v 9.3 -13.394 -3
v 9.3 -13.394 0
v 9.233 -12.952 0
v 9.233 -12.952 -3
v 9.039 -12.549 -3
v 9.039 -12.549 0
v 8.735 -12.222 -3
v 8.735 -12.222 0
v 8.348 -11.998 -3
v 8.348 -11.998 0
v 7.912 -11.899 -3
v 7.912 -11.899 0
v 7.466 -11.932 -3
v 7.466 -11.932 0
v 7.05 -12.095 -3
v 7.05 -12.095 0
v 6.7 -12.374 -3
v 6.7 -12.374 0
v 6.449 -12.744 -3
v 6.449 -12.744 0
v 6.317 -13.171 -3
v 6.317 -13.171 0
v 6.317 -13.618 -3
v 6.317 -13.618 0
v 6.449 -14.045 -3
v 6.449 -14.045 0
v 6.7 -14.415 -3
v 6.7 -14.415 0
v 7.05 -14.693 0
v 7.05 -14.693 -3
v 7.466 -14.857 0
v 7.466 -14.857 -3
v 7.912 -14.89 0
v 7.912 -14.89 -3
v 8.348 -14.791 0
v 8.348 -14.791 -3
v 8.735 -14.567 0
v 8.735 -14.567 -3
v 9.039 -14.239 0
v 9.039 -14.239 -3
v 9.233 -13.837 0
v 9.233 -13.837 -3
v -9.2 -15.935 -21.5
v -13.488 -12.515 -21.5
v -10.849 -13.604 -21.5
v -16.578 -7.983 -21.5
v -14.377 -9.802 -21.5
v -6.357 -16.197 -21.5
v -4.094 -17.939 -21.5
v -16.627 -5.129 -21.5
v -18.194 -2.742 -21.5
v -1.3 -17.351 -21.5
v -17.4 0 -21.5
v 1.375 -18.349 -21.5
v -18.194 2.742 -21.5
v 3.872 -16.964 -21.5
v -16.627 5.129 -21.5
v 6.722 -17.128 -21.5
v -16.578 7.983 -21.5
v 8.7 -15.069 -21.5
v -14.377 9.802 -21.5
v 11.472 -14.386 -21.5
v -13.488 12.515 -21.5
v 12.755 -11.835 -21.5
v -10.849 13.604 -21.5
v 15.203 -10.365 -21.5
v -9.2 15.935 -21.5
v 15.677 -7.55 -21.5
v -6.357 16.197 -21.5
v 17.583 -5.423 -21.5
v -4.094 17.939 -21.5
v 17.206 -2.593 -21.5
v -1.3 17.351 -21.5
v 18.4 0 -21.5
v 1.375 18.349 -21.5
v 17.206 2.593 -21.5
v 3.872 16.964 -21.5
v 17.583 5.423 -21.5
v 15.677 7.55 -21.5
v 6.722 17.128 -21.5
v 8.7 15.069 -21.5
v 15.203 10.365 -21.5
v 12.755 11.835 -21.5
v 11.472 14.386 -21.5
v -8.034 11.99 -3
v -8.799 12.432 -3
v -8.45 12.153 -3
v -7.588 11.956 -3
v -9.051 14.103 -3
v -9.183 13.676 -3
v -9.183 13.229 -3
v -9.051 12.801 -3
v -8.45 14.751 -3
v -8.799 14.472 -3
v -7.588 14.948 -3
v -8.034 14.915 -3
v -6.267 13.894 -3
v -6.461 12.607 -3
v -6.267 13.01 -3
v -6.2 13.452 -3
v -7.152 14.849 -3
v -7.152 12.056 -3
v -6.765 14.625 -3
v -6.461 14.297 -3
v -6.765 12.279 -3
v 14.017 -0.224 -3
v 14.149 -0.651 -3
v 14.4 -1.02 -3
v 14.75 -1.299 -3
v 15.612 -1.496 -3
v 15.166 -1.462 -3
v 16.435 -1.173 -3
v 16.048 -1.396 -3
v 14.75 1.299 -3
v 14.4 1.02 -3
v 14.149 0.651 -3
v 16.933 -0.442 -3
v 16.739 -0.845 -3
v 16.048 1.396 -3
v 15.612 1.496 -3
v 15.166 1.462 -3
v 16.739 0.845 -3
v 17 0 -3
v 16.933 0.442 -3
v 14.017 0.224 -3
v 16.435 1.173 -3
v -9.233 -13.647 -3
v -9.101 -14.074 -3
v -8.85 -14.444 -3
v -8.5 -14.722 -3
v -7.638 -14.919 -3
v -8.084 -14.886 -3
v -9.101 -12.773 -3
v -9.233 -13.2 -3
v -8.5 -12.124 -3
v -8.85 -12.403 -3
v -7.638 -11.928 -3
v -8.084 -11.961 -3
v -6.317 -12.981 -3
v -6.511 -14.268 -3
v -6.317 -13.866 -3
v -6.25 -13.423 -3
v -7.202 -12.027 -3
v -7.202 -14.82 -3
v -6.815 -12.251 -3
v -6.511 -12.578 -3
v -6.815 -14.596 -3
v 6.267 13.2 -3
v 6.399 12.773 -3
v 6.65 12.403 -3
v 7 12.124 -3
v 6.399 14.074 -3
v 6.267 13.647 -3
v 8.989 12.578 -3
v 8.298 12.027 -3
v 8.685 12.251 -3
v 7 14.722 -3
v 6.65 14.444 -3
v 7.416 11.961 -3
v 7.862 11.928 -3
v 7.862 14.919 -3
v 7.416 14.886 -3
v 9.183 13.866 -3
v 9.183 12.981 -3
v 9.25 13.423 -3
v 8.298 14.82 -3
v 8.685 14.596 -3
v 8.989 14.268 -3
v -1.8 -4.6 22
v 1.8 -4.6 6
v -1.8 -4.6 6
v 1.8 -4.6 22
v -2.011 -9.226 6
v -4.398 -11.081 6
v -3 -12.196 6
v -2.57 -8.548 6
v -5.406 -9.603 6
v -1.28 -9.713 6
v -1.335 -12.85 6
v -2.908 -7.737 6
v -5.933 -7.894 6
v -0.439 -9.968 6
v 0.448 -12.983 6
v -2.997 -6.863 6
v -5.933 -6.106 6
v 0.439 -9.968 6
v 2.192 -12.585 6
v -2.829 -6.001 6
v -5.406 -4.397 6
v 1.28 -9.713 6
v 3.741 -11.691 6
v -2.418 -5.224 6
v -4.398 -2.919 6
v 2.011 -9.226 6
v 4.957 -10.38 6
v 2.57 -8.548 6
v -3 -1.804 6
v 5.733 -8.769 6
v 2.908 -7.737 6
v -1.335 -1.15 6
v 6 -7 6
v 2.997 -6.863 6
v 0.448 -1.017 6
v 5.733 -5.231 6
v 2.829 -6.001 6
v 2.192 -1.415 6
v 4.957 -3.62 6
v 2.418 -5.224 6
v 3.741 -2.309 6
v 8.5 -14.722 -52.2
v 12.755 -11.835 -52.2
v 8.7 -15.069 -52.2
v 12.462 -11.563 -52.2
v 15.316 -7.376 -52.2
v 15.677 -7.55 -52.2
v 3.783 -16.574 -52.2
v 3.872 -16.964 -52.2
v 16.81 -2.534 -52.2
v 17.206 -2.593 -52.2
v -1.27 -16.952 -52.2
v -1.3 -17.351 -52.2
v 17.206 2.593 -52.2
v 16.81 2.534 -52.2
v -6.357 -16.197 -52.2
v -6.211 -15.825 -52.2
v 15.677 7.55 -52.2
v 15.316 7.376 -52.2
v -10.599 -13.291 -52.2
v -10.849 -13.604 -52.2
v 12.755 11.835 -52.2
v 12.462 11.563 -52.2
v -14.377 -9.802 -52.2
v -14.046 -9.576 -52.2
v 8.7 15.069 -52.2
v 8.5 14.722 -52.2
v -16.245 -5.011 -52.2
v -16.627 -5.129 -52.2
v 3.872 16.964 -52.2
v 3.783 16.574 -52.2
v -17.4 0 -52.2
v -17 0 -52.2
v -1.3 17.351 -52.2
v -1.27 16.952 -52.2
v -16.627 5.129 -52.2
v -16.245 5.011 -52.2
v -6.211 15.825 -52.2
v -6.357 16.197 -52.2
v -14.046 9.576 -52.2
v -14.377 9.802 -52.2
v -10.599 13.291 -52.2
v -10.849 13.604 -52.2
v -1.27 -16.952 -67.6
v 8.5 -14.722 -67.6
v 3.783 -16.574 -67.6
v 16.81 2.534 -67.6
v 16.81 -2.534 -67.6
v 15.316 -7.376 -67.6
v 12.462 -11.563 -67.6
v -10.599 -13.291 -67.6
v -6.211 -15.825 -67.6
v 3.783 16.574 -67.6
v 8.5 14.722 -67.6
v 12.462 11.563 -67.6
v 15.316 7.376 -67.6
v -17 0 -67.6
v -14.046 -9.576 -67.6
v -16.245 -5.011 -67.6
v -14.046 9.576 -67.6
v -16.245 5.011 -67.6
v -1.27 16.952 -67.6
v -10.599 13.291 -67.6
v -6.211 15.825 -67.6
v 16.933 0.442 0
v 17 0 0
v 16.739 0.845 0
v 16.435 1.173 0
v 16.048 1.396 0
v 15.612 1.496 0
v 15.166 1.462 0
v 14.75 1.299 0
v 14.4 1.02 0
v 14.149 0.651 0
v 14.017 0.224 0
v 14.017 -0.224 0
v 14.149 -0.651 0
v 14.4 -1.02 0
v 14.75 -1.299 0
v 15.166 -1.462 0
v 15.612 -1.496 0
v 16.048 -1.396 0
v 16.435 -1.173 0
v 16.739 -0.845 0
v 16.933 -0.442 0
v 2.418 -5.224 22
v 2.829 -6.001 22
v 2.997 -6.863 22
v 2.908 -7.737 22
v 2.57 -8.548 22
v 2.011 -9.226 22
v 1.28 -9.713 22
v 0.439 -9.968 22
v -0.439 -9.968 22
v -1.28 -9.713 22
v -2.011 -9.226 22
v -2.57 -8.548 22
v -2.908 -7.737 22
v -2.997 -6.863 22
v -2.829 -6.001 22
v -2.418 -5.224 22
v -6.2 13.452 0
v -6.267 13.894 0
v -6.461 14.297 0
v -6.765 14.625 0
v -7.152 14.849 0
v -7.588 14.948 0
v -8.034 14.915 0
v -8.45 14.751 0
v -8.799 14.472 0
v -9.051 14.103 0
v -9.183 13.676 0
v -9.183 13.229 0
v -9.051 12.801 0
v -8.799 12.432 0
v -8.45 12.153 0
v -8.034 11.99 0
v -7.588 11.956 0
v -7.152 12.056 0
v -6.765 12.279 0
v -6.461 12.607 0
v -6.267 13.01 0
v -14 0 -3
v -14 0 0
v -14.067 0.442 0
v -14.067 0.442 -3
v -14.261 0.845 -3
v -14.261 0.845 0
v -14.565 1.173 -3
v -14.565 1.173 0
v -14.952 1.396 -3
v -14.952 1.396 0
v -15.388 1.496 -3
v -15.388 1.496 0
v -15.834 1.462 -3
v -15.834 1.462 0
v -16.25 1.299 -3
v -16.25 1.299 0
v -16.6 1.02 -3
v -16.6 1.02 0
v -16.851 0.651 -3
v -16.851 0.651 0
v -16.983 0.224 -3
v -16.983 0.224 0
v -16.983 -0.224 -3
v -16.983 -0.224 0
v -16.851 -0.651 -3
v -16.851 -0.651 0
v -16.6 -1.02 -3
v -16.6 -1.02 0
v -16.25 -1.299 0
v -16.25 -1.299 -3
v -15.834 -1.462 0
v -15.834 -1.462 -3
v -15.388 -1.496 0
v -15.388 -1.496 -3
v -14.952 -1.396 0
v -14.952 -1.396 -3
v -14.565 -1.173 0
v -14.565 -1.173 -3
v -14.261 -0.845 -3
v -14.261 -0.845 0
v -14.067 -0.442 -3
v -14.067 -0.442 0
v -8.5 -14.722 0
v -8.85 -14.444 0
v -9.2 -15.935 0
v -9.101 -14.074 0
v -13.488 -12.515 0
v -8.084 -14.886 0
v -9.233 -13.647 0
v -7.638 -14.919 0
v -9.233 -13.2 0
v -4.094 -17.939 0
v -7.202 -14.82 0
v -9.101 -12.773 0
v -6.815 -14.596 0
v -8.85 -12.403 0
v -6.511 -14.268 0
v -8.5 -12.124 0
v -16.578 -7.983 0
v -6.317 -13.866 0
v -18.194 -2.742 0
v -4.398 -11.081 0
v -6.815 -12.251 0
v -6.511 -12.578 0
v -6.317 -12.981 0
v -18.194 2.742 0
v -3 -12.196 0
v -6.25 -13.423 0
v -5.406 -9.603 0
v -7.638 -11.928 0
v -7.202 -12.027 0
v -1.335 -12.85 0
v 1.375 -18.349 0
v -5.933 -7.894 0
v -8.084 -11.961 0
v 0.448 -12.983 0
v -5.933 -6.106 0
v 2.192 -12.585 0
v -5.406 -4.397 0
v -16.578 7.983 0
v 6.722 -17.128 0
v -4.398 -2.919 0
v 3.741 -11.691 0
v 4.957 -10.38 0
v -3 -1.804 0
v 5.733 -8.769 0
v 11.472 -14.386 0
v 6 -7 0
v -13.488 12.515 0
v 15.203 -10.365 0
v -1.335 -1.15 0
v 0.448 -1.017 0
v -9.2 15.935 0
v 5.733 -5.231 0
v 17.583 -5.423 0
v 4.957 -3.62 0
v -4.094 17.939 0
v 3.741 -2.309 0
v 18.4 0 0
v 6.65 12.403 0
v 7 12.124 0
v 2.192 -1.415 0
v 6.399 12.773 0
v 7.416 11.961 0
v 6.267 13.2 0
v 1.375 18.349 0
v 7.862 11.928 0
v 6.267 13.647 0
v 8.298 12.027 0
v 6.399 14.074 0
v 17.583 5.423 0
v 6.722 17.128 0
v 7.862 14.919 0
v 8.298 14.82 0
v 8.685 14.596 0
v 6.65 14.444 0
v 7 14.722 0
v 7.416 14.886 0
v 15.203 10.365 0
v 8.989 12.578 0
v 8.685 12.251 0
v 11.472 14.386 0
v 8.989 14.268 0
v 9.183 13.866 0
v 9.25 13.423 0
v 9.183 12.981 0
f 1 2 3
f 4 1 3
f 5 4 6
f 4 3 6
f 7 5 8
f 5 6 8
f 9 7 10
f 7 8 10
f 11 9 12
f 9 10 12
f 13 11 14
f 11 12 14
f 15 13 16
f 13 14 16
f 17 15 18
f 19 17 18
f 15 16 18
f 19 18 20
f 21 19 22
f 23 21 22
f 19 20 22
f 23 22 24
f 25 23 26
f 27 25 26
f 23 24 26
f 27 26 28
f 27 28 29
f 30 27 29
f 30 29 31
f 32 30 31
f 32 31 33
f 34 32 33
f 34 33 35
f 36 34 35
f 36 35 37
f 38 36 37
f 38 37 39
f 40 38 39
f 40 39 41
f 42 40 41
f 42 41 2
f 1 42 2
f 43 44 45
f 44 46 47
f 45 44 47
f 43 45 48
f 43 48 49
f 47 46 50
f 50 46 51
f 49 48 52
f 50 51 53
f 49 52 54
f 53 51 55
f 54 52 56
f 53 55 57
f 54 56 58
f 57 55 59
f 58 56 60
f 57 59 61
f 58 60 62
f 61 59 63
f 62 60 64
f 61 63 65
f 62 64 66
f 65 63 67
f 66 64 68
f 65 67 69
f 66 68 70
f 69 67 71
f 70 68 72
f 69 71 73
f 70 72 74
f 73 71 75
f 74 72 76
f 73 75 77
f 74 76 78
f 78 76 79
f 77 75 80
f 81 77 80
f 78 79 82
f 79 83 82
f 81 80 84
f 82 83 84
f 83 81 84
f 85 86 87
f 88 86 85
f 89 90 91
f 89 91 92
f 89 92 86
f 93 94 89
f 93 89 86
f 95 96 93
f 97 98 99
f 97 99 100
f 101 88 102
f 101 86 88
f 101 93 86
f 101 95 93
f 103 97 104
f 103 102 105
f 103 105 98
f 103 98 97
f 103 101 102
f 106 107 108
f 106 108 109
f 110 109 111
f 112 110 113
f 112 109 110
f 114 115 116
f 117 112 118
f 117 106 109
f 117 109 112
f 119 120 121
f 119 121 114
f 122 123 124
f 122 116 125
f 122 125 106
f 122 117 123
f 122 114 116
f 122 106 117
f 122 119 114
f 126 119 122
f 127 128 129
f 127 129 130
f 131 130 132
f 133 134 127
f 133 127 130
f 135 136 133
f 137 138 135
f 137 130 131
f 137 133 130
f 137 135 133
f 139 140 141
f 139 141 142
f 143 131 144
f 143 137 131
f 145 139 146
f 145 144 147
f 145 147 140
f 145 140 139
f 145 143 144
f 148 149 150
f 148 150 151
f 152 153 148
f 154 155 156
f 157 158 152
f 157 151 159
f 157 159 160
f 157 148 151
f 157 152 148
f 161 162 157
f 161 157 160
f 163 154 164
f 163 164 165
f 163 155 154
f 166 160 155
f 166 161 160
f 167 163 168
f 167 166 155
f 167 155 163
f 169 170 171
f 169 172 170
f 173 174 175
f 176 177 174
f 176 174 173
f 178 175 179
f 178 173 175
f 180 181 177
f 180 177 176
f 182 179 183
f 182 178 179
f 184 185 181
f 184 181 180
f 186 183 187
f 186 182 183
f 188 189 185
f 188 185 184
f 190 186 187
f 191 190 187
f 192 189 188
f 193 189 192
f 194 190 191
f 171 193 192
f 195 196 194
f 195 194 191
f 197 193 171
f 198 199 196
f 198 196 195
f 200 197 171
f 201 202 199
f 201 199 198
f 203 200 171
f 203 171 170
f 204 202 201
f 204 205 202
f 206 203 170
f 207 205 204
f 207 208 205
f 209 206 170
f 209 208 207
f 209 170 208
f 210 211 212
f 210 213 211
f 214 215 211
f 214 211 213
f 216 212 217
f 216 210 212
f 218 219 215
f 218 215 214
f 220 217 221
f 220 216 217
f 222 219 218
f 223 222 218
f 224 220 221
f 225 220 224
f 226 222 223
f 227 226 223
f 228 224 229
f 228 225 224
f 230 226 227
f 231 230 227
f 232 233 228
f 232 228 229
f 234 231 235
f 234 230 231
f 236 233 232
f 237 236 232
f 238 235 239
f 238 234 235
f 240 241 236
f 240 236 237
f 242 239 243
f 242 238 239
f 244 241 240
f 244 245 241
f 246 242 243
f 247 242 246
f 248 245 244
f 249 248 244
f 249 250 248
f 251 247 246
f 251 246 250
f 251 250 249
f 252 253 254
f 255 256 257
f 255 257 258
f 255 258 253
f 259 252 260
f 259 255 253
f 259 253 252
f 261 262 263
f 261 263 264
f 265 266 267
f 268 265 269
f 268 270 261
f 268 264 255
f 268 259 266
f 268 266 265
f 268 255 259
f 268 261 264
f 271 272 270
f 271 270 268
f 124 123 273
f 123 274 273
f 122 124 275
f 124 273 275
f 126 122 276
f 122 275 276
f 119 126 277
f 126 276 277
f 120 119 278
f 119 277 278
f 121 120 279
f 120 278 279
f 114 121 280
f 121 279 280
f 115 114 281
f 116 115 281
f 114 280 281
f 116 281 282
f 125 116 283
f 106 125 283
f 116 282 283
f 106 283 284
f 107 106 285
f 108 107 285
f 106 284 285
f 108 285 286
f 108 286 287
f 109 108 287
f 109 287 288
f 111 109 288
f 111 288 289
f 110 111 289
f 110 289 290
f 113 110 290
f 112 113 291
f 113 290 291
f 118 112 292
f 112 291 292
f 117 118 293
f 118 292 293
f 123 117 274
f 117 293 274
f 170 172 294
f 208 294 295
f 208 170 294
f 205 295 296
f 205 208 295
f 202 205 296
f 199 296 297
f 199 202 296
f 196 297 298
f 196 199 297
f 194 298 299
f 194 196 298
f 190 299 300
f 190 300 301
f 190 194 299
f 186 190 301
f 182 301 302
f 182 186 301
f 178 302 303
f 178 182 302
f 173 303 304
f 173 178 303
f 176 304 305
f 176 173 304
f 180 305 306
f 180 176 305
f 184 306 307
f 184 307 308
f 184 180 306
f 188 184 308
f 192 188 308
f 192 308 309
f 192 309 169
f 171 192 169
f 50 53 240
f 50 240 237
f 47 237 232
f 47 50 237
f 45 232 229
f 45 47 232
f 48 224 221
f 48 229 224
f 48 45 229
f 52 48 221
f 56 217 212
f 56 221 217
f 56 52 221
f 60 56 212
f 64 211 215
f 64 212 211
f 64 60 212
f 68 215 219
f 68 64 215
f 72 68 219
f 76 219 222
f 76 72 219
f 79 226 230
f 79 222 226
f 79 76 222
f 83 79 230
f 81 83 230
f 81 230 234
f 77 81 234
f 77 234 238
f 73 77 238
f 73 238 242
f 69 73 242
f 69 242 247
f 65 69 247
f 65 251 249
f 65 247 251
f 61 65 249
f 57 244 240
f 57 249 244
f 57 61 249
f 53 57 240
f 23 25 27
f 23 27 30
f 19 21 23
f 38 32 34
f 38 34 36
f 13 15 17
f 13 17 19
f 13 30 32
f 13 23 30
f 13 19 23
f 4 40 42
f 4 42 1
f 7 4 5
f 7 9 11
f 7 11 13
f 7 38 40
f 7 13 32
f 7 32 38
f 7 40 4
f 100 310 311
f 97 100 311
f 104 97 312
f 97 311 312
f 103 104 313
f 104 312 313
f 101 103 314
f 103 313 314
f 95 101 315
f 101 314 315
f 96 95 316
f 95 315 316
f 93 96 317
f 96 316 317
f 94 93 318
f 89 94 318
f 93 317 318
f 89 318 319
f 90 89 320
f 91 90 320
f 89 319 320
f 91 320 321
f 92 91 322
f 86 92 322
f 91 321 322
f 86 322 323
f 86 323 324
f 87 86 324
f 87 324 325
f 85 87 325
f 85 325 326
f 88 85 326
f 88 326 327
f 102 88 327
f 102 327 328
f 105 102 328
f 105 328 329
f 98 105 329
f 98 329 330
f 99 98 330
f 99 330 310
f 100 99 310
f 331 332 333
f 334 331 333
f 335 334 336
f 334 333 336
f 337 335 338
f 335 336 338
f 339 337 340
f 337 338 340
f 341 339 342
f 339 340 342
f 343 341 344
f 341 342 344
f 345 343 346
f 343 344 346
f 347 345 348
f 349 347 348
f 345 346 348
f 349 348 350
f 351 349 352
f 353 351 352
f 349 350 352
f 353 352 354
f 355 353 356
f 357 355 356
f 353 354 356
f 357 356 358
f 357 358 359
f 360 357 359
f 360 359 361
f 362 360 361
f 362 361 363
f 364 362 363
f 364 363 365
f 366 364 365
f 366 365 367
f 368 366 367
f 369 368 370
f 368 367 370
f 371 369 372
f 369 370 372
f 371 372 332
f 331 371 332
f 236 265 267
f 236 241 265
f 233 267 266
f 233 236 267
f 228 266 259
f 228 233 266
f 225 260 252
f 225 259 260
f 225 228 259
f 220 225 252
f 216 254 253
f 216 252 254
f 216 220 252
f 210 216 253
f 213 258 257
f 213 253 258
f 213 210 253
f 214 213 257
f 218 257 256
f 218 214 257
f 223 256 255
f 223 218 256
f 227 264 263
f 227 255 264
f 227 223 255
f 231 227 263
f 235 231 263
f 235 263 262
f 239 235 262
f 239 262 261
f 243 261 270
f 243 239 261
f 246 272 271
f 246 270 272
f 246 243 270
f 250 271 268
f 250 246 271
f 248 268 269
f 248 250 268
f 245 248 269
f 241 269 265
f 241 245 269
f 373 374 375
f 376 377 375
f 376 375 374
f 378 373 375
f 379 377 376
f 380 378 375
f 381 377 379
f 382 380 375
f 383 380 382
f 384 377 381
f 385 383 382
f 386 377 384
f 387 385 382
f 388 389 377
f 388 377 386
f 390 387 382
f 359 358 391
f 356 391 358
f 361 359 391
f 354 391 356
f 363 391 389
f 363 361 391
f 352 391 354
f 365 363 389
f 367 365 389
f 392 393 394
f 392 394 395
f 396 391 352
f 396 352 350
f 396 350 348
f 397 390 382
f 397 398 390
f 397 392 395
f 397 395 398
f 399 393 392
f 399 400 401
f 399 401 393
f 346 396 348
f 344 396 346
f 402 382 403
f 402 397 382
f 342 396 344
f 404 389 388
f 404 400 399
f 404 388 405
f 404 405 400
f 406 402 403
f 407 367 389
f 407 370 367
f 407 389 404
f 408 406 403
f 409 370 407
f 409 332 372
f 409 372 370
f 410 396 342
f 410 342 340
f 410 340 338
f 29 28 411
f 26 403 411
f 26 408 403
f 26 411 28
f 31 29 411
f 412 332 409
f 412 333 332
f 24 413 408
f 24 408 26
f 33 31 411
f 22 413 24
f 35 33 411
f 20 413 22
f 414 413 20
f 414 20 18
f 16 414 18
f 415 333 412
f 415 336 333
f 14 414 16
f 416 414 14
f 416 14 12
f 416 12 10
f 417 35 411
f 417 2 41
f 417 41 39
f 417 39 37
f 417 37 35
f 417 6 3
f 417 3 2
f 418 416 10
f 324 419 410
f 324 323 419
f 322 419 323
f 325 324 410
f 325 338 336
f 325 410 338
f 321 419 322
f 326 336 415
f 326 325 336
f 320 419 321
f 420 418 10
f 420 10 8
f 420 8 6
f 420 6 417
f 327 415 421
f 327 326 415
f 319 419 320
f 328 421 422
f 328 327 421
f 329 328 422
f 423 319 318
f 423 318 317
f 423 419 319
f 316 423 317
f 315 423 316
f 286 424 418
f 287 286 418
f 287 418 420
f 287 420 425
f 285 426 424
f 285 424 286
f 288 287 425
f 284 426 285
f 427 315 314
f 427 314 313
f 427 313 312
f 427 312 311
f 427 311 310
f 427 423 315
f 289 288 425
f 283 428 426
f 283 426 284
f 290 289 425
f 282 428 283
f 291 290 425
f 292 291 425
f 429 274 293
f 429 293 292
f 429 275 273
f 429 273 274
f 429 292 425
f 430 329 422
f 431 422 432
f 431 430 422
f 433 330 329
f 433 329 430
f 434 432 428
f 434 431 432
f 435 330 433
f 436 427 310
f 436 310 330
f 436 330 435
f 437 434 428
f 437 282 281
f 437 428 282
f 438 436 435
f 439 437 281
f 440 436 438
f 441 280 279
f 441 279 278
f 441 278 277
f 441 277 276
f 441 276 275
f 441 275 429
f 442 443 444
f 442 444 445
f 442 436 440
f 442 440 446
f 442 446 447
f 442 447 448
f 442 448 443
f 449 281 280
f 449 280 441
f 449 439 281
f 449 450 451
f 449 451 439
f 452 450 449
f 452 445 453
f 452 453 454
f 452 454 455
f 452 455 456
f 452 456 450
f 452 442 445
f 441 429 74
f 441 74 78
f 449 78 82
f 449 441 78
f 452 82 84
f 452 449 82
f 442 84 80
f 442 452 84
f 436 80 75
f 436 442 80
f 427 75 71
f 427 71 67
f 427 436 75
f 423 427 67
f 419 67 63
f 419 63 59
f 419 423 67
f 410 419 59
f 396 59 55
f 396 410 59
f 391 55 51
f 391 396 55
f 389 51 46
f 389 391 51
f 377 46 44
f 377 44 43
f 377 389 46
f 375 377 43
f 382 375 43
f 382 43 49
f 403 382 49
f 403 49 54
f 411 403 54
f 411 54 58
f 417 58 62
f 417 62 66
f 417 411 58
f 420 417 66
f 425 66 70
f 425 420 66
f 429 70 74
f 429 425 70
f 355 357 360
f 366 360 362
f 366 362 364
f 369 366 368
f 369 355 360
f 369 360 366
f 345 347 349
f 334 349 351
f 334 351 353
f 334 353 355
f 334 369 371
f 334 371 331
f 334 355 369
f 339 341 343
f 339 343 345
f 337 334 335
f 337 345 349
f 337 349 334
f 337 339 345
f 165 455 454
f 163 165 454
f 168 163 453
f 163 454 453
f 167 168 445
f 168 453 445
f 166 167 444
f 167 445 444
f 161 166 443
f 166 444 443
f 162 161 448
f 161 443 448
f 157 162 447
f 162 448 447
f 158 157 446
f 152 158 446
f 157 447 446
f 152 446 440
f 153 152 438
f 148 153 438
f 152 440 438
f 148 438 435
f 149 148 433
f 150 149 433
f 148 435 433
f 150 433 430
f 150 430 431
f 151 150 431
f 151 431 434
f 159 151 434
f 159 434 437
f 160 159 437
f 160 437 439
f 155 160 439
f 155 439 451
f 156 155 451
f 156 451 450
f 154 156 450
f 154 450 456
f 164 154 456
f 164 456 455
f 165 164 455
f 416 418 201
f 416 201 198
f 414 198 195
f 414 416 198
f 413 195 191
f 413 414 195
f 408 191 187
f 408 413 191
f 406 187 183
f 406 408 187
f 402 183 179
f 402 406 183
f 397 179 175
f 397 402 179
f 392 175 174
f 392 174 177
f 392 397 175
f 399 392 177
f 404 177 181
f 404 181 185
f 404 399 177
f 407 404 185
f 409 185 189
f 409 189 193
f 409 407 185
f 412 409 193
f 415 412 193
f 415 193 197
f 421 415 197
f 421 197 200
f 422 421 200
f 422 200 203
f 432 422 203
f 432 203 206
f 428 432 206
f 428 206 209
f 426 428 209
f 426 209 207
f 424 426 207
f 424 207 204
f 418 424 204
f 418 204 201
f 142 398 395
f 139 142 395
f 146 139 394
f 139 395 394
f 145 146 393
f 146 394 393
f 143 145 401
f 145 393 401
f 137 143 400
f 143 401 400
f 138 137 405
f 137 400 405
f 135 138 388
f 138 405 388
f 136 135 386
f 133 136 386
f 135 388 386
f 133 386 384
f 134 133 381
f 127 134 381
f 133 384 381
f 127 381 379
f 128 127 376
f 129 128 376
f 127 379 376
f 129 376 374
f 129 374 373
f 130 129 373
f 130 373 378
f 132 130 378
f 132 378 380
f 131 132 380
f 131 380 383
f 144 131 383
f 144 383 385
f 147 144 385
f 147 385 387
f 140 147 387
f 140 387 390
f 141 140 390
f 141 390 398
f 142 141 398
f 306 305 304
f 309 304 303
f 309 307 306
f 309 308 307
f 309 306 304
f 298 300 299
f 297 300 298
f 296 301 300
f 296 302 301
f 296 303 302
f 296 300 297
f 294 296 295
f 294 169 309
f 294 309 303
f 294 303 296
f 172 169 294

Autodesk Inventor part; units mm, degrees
ref_plane "YZ Plane" through (0, 0, 0) normal (1, 0, 0) x (0, 1, 0)
ref_plane "XZ Plane" through (0, 0, 0) normal (0, 1, 0) x (-1, 0, 0)
ref_plane "XY Plane" through (0, 0, 0) normal (0, 0, 1) x (1, 0, 0)
sketch "Sketch1" plane through (0, 0, 0) normal (0, 0, 1) x (1, 0, 0)
  point P0 (0, 0)
sketch "Sketch2" plane through (0, 0, 0) normal (0, 0, 1) x (1, 0, 0)
  circle A0 centre (0, 0) radius 18.4
  dimension "d0" = 36.8
extrude "Extrusion1" add sketch "Sketch2" against normal blind 21.5
sketch "Sketch3" plane through (0, 0, -21.5) normal (0, 0, -1) x (-1, 0, 0)
  circle A0 centre (0, 0) radius 17.4
  dimension "d3" = 34.8
extrude "Extrusion2" add sketch "Sketch3" along normal blind 30.7
sketch "Sketch4" plane through (0, 0, -52.2) normal (0, 0, -1) x (-1, 0, 0)
  circle A0 centre (0, 0) radius 17
  dimension "d6" = 34
extrude "Extrusion3" add sketch "Sketch4" along normal blind 15.4
sketch "Sketch5" plane through (0, 0, 0) normal (0, 0, 1) x (1, 0, 0)
  circle A0 centre (-15.5, 0) radius 1.5
  circle A1 centre (0, 0) radius 18.4 projected
  line L0 (-18.4, 0) -> (18.4, 0)
  line L1 (-1.5961, -18.3306) -> (-1.5961, -18.3306)
  line L2 (0, 18.4) -> (0, -18.4)
  circle A2 centre (0, -7) radius 6
  circle A3 centre (15.5, 0) radius 1.5
  circle A4 centre (0, 0) radius 15.5
  line L3 (-11.863, 20.6629) -> (9.25, -15.9059)
  circle A5 centre (0, 0) radius 18.4 projected
  line L4 (-9.2, -15.9349) -> (9.2, 15.9349)
  circle A6 centre (7.8, -13.3944) radius 1.5
  circle A7 centre (7.75, 13.4234) radius 1.5
  circle A8 centre (-7.75, -13.4234) radius 1.5
  circle A9 centre (-7.6999, 13.4522) radius 1.5
  point P0 (7.75, 13.4234)
  point P1 (7.8, -13.3944)
  dimension "d10" = 3
  dimension "d11" = 12
  dimension "d12" = 7
  dimension "d15" = 3
  dimension "d16" = 31
  dimension "d17" = 2.9
  dimension "d19" = 60
  dimension "d20" = 60
  dimension "d21" = 3
  dimension "d22" = 3
  dimension "d23" = 3
  dimension "d24" = 3
extrude "Extrusion4" add sketch "Sketch5" along normal blind 6 contours A2 L3 L2 | L2 A2 L4 | L4 A2 | A2 L3 picked at (-1.9225, -8.5027)
extrude "Extrusion5" cut sketch "Sketch5" against normal blind 3 contours L0 A4 A0 | A0 A4 L0 | A4 L0 A0 | A0 L0 A4 | A9 L3 A4 | A4 L3 A9 | A8 L4 A4 | A4 L4 A8 | L3 A9 A4 | A4 A9 L3 | L4 A8 A4 | A4 A8 L4 | A3 A4 L0 | L0 A4 A3 | A7 A4 L4 | L4 A4 A7 | A4 A3 L0 | L0 A3 A4 | A7 L4 A4 | L4 A7 A4 | A6 L3 A4 | A4 L3 A6 | L3 A4 A6 | A4 L3 A6
sketch "Sketch6" plane through (0, -7, 6) normal (0, 0, 1) x (1, 0, 0)
  circle A0 centre (0, 0) radius 6 projected
  circle A1 centre (0, 0) radius 3
  point P0 (0, 7)
  dimension "d27" = 6
extrude "Extrusion6" add sketch "Sketch6" along normal blind 16 contours A1
sketch "Sketch7" plane through (0, -7, 22) normal (0, 0, 1) x (1, 0, 0)
  line L0 (-6, 3) -> (6, 3)
  line L1 (6, 3) -> (6, 2.4)
  line L2 (6, 2.4) -> (-6, 2.4)
  line L3 (-6, 2.4) -> (-6, 3)
  circle A0 centre (0, 0) radius 6 projected
  circle A1 centre (0, 0) radius 3 projected
  circle A2 centre (0, 0) radius 3 projected
  line L4 (0, 3) -> (0, -3)
  point P0 (0, 7)
  dimension "d30" = 0.6
extrude "Extrusion7" cut sketch "Sketch7" against normal up to surface (16 mm away) contours L0 A0 L2 L3 | L0 A1 L2 A0 | L0 A0 L2 A1 | L4 L2 A1 | A1 L2 L4 | L0 L1 L2 A0 picked at (-1.016, 2.5094) picked at (1.016, 2.5094)
properties part number "Motor"
